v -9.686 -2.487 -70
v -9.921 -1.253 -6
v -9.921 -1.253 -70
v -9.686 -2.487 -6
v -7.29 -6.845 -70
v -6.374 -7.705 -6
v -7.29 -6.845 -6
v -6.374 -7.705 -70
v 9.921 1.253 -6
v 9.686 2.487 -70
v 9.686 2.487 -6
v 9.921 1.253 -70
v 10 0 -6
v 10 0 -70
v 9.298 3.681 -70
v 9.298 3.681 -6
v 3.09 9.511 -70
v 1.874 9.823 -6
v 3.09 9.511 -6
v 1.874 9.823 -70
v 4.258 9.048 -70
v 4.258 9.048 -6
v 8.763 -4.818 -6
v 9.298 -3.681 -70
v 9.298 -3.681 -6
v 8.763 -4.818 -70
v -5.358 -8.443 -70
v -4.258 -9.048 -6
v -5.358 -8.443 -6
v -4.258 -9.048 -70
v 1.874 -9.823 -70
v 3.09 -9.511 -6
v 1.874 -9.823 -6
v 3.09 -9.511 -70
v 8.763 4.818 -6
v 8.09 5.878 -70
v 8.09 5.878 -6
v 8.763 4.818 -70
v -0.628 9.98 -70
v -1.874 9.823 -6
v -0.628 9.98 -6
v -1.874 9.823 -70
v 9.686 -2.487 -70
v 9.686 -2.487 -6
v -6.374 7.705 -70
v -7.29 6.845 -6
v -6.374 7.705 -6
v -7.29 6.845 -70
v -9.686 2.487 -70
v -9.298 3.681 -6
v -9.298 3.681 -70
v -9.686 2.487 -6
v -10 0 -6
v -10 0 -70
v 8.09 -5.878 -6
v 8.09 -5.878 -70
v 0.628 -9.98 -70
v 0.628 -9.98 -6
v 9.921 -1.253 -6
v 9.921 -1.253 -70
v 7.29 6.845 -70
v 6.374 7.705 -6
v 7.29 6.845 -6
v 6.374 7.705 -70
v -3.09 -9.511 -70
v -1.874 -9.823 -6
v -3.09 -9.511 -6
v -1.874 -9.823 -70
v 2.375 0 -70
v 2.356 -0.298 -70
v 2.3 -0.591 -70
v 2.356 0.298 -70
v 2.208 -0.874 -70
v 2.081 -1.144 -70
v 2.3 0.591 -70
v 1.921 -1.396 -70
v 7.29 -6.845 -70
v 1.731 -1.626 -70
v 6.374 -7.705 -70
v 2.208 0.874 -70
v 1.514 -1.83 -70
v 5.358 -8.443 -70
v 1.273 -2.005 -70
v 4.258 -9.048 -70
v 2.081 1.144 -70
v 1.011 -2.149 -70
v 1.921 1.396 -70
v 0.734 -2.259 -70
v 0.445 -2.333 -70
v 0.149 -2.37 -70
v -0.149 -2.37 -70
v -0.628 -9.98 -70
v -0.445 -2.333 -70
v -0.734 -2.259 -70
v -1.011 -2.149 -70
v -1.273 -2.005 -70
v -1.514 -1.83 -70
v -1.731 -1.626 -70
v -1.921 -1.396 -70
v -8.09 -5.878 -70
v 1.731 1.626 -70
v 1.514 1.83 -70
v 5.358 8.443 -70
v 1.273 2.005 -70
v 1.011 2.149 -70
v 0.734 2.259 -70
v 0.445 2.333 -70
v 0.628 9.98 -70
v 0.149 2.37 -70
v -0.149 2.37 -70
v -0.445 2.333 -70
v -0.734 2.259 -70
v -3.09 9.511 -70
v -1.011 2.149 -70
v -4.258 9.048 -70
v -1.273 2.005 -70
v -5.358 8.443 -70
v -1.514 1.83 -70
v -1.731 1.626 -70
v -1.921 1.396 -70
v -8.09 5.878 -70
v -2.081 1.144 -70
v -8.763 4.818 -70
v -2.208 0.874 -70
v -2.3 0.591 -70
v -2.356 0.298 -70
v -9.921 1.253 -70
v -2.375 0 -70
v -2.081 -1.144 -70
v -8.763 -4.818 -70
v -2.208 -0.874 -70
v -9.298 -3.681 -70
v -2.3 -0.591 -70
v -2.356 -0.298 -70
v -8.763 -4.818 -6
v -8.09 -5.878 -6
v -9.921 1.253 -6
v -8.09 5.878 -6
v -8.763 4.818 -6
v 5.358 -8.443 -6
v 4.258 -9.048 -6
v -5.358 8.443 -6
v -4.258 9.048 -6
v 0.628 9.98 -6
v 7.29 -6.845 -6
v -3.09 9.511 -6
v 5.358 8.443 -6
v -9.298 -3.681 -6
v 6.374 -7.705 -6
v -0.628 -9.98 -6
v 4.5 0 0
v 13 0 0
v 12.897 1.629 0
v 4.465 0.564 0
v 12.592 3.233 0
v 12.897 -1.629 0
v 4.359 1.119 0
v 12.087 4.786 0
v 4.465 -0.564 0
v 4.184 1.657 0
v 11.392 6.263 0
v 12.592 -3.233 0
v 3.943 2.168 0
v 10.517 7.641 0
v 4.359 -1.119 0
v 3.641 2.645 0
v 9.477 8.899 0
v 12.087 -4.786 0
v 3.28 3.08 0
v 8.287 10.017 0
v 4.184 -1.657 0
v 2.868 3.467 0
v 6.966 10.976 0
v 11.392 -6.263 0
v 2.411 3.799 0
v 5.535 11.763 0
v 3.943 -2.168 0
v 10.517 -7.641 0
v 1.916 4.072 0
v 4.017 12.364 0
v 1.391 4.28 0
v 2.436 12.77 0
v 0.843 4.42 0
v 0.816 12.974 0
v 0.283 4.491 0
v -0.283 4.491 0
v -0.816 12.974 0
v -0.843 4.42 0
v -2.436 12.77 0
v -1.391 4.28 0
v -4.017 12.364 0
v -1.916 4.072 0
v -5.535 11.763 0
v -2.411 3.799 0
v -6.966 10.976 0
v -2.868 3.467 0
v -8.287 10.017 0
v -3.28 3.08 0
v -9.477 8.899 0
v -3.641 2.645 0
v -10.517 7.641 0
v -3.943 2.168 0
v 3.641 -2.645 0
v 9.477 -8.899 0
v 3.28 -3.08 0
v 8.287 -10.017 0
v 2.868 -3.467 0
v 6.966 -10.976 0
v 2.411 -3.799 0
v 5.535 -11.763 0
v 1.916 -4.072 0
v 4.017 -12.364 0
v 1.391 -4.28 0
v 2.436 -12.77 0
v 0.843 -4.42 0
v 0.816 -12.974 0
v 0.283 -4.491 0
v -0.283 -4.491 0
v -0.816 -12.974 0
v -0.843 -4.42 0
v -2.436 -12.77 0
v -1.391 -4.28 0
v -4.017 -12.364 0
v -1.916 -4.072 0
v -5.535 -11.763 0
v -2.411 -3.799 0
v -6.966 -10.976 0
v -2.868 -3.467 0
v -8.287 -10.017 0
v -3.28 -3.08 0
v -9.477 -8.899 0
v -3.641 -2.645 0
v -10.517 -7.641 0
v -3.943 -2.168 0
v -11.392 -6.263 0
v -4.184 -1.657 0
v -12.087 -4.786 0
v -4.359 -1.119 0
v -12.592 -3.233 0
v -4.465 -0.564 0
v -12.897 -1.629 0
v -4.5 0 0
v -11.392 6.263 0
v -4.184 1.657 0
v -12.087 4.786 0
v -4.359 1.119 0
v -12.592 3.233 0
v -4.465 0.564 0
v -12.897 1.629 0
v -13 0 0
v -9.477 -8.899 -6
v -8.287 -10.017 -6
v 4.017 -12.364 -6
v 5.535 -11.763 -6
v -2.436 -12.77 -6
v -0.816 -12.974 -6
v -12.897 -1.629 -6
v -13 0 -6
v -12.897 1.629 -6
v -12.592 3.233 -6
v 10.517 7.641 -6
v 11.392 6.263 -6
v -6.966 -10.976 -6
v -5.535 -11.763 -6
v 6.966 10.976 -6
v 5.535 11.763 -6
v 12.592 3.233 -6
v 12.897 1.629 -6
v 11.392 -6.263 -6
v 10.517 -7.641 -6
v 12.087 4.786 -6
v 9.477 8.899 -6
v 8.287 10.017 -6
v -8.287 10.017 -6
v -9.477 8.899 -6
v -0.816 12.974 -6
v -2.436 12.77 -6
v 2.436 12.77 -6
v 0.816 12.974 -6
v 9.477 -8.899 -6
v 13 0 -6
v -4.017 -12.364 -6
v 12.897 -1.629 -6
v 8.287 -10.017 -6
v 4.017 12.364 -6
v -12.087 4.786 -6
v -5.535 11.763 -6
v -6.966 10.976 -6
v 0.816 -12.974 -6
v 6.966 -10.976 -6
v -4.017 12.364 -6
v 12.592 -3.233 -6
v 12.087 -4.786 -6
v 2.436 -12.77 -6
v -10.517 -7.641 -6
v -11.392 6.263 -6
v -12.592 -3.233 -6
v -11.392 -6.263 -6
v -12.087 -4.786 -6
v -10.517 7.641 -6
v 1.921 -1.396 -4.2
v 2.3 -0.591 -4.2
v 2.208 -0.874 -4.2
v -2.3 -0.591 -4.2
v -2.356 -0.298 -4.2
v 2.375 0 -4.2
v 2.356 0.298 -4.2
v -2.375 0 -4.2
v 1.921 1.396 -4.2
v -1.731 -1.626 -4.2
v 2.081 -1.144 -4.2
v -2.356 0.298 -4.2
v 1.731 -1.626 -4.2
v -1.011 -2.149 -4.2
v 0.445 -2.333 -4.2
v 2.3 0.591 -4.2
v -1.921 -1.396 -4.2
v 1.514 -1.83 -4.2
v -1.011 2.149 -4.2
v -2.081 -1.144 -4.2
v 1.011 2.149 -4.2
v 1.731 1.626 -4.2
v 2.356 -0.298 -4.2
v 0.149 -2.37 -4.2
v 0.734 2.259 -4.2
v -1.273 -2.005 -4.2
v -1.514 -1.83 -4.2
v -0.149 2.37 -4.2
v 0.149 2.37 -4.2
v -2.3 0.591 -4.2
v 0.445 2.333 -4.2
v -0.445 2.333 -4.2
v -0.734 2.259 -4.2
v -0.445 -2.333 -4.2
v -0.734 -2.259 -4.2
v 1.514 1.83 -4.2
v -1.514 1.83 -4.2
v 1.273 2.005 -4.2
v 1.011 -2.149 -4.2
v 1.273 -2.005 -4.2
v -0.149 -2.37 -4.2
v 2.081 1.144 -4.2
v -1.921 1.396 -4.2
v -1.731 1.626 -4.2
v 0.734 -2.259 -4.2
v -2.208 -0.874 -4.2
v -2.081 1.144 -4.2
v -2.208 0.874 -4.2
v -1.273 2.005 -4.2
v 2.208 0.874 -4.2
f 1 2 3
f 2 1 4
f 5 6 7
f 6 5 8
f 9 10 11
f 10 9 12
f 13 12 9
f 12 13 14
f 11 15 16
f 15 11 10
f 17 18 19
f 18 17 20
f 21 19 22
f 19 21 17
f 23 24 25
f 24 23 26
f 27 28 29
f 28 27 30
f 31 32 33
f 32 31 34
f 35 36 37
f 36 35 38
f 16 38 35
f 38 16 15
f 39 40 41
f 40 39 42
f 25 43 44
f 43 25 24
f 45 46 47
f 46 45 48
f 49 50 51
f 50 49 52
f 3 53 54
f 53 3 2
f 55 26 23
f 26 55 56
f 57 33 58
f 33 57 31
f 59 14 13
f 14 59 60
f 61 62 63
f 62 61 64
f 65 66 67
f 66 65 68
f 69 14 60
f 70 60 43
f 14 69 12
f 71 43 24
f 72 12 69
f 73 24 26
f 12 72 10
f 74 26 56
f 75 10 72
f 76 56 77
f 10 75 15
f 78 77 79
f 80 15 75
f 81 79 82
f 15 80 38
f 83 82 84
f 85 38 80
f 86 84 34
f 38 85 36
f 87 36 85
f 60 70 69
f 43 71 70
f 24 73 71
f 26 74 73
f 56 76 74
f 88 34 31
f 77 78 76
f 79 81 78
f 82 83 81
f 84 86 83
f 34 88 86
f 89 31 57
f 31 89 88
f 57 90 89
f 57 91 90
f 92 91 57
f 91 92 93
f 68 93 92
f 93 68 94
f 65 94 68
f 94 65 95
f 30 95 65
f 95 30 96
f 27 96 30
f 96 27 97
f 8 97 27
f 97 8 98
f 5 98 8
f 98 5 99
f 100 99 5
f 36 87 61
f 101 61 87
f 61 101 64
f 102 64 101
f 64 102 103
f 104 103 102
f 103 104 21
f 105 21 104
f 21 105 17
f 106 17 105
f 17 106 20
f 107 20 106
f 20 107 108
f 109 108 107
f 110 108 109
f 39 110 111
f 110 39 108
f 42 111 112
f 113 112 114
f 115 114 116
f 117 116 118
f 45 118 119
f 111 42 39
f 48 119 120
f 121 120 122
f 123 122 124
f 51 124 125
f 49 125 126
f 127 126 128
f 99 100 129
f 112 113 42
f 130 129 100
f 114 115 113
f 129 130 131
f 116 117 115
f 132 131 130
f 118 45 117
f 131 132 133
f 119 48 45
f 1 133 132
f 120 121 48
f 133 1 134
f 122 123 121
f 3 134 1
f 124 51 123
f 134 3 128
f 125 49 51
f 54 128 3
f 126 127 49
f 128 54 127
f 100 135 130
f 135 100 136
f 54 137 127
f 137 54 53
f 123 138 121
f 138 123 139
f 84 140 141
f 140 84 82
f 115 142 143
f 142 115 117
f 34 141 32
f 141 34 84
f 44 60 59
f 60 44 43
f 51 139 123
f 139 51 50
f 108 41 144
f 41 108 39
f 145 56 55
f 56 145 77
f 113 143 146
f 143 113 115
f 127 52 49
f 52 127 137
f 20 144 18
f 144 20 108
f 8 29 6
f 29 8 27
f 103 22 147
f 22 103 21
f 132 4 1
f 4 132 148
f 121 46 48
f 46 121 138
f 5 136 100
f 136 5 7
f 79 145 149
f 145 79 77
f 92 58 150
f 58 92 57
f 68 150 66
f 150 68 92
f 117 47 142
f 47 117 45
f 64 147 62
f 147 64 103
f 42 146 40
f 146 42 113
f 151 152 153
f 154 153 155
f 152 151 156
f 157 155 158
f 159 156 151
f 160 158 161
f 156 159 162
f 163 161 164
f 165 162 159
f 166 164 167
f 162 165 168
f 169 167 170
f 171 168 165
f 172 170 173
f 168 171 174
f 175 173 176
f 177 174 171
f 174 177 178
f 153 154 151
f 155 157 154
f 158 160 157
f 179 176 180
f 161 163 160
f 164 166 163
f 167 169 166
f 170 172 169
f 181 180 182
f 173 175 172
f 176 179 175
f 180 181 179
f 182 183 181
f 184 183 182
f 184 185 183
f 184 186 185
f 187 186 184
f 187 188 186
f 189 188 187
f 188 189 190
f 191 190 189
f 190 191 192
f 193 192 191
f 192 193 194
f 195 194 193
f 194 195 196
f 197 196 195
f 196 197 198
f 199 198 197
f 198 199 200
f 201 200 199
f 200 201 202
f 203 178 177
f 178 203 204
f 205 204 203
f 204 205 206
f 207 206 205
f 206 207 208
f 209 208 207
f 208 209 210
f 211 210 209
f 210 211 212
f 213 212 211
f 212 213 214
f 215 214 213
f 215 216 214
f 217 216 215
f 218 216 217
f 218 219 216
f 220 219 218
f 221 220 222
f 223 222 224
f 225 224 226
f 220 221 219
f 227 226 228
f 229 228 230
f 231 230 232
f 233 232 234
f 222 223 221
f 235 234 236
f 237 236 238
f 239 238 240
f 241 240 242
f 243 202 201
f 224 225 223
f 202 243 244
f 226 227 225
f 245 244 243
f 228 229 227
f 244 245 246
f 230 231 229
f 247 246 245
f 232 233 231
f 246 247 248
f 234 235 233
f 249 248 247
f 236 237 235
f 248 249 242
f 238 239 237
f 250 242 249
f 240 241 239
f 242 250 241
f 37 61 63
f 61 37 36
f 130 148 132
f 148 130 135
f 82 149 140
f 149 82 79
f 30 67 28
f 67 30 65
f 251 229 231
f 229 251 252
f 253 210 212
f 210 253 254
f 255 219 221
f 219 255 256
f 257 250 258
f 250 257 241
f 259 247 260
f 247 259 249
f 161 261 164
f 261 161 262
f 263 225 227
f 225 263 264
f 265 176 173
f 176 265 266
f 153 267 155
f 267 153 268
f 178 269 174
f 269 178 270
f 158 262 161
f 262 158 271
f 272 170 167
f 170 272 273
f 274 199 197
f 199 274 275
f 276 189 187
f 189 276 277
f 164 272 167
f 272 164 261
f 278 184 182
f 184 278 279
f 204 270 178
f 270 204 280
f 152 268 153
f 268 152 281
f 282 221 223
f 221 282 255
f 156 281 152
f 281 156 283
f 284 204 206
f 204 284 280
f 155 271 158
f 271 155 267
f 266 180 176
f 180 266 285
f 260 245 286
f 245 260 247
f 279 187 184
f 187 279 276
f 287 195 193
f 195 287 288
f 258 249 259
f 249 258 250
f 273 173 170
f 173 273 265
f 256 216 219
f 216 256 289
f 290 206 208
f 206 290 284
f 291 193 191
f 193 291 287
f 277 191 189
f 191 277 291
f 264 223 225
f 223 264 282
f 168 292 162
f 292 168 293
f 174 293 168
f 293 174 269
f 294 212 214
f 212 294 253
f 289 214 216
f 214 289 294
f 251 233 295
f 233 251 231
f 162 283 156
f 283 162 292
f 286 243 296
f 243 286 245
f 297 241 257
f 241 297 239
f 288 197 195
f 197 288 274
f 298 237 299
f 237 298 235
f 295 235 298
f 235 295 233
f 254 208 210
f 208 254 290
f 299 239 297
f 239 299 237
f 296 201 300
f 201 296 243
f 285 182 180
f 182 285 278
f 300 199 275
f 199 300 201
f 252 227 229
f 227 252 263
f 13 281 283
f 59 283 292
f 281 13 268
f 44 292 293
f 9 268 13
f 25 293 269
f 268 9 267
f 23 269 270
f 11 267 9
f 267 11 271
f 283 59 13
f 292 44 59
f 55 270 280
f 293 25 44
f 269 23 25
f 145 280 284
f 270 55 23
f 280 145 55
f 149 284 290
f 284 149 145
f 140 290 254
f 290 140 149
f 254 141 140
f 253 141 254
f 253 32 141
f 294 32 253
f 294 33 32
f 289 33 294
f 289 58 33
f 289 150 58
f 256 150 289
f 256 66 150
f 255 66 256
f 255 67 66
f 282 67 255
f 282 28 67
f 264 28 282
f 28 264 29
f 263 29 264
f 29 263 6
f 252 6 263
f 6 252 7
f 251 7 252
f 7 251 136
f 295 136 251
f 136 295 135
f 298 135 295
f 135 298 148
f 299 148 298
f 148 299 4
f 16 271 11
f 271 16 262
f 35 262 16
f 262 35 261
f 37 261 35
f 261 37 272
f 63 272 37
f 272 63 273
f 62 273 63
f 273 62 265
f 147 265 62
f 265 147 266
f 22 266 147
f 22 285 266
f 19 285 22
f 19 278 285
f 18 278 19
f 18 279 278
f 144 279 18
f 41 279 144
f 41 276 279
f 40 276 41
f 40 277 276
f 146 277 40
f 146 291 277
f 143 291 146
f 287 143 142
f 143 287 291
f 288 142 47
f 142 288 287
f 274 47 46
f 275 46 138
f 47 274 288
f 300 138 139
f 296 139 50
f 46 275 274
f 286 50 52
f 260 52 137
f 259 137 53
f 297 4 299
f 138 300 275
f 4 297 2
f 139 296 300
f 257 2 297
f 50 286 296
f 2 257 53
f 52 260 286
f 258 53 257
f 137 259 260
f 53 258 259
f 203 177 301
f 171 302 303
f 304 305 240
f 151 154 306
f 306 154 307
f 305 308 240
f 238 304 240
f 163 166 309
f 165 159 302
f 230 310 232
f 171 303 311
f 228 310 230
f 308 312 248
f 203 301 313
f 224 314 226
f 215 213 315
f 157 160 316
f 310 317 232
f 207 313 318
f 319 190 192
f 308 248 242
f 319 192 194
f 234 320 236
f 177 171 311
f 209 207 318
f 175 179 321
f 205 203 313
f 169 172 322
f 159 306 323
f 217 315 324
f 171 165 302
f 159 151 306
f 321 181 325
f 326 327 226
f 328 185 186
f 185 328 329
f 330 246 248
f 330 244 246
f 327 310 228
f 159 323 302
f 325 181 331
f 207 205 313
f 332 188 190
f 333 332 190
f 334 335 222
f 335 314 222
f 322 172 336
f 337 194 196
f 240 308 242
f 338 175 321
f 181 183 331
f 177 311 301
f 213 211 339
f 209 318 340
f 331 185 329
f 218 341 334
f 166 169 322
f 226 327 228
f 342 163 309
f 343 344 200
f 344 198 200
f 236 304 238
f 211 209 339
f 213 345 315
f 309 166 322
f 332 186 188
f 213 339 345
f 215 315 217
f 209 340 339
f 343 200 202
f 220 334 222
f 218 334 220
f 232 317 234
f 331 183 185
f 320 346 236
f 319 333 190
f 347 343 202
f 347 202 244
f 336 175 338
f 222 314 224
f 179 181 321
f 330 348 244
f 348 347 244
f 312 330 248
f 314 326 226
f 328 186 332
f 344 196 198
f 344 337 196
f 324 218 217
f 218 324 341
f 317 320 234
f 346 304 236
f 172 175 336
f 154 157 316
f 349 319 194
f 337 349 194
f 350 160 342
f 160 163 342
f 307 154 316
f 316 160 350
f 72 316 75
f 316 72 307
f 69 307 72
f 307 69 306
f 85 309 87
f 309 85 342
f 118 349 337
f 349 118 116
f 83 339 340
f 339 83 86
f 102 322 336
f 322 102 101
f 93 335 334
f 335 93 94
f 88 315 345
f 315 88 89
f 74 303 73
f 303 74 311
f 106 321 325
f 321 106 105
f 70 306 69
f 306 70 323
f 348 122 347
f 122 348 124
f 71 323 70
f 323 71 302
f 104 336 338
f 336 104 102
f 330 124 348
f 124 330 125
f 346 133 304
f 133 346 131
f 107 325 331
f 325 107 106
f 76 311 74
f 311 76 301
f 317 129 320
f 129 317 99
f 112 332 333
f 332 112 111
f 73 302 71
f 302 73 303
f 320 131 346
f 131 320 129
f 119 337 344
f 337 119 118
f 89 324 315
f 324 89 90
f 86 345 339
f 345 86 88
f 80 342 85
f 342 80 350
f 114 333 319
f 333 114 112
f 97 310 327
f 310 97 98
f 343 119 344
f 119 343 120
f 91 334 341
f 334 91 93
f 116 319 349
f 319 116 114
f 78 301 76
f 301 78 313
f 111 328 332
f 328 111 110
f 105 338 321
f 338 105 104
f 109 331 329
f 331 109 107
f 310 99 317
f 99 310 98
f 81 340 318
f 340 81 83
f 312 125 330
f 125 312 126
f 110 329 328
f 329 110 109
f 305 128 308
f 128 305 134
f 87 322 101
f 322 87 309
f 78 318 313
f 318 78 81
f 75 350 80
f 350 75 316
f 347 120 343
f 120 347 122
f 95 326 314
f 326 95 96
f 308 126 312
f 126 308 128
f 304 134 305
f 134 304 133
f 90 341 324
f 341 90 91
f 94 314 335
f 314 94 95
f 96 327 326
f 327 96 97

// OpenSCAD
$fn = 50;


difference() {
	union() {
		translate(v = [0, 0, -70.0000000000]) {
			cylinder(h = 70, r = 10.0000000000);
		}
		translate(v = [0, 0, -6.0000000000]) {
			cylinder(h = 6, r = 13.0000000000);
		}
	}
	union() {
		translate(v = [0, 0, 0]) {
			rotate(a = [0, 0, 0]) {
				difference() {
					union() {
						#translate(v = [0, 0, -70.0000000000]) {
							cylinder(h = 70, r = 2.2500000000);
						}
						#translate(v = [0, 0, -4.2000000000]) {
							cylinder(h = 4.2000000000, r = 10.0000000000, r1 = 2.3750000000, r2 = 4.5000000000);
						}
						#translate(v = [0, 0, -70.0000000000]) {
							cylinder(h = 70, r = 2.3750000000);
						}
						#translate(v = [0, 0, -70.0000000000]) {
							cylinder(h = 70, r = 2.2500000000);
						}
					}
					union();
				}
			}
		}
	}
}
